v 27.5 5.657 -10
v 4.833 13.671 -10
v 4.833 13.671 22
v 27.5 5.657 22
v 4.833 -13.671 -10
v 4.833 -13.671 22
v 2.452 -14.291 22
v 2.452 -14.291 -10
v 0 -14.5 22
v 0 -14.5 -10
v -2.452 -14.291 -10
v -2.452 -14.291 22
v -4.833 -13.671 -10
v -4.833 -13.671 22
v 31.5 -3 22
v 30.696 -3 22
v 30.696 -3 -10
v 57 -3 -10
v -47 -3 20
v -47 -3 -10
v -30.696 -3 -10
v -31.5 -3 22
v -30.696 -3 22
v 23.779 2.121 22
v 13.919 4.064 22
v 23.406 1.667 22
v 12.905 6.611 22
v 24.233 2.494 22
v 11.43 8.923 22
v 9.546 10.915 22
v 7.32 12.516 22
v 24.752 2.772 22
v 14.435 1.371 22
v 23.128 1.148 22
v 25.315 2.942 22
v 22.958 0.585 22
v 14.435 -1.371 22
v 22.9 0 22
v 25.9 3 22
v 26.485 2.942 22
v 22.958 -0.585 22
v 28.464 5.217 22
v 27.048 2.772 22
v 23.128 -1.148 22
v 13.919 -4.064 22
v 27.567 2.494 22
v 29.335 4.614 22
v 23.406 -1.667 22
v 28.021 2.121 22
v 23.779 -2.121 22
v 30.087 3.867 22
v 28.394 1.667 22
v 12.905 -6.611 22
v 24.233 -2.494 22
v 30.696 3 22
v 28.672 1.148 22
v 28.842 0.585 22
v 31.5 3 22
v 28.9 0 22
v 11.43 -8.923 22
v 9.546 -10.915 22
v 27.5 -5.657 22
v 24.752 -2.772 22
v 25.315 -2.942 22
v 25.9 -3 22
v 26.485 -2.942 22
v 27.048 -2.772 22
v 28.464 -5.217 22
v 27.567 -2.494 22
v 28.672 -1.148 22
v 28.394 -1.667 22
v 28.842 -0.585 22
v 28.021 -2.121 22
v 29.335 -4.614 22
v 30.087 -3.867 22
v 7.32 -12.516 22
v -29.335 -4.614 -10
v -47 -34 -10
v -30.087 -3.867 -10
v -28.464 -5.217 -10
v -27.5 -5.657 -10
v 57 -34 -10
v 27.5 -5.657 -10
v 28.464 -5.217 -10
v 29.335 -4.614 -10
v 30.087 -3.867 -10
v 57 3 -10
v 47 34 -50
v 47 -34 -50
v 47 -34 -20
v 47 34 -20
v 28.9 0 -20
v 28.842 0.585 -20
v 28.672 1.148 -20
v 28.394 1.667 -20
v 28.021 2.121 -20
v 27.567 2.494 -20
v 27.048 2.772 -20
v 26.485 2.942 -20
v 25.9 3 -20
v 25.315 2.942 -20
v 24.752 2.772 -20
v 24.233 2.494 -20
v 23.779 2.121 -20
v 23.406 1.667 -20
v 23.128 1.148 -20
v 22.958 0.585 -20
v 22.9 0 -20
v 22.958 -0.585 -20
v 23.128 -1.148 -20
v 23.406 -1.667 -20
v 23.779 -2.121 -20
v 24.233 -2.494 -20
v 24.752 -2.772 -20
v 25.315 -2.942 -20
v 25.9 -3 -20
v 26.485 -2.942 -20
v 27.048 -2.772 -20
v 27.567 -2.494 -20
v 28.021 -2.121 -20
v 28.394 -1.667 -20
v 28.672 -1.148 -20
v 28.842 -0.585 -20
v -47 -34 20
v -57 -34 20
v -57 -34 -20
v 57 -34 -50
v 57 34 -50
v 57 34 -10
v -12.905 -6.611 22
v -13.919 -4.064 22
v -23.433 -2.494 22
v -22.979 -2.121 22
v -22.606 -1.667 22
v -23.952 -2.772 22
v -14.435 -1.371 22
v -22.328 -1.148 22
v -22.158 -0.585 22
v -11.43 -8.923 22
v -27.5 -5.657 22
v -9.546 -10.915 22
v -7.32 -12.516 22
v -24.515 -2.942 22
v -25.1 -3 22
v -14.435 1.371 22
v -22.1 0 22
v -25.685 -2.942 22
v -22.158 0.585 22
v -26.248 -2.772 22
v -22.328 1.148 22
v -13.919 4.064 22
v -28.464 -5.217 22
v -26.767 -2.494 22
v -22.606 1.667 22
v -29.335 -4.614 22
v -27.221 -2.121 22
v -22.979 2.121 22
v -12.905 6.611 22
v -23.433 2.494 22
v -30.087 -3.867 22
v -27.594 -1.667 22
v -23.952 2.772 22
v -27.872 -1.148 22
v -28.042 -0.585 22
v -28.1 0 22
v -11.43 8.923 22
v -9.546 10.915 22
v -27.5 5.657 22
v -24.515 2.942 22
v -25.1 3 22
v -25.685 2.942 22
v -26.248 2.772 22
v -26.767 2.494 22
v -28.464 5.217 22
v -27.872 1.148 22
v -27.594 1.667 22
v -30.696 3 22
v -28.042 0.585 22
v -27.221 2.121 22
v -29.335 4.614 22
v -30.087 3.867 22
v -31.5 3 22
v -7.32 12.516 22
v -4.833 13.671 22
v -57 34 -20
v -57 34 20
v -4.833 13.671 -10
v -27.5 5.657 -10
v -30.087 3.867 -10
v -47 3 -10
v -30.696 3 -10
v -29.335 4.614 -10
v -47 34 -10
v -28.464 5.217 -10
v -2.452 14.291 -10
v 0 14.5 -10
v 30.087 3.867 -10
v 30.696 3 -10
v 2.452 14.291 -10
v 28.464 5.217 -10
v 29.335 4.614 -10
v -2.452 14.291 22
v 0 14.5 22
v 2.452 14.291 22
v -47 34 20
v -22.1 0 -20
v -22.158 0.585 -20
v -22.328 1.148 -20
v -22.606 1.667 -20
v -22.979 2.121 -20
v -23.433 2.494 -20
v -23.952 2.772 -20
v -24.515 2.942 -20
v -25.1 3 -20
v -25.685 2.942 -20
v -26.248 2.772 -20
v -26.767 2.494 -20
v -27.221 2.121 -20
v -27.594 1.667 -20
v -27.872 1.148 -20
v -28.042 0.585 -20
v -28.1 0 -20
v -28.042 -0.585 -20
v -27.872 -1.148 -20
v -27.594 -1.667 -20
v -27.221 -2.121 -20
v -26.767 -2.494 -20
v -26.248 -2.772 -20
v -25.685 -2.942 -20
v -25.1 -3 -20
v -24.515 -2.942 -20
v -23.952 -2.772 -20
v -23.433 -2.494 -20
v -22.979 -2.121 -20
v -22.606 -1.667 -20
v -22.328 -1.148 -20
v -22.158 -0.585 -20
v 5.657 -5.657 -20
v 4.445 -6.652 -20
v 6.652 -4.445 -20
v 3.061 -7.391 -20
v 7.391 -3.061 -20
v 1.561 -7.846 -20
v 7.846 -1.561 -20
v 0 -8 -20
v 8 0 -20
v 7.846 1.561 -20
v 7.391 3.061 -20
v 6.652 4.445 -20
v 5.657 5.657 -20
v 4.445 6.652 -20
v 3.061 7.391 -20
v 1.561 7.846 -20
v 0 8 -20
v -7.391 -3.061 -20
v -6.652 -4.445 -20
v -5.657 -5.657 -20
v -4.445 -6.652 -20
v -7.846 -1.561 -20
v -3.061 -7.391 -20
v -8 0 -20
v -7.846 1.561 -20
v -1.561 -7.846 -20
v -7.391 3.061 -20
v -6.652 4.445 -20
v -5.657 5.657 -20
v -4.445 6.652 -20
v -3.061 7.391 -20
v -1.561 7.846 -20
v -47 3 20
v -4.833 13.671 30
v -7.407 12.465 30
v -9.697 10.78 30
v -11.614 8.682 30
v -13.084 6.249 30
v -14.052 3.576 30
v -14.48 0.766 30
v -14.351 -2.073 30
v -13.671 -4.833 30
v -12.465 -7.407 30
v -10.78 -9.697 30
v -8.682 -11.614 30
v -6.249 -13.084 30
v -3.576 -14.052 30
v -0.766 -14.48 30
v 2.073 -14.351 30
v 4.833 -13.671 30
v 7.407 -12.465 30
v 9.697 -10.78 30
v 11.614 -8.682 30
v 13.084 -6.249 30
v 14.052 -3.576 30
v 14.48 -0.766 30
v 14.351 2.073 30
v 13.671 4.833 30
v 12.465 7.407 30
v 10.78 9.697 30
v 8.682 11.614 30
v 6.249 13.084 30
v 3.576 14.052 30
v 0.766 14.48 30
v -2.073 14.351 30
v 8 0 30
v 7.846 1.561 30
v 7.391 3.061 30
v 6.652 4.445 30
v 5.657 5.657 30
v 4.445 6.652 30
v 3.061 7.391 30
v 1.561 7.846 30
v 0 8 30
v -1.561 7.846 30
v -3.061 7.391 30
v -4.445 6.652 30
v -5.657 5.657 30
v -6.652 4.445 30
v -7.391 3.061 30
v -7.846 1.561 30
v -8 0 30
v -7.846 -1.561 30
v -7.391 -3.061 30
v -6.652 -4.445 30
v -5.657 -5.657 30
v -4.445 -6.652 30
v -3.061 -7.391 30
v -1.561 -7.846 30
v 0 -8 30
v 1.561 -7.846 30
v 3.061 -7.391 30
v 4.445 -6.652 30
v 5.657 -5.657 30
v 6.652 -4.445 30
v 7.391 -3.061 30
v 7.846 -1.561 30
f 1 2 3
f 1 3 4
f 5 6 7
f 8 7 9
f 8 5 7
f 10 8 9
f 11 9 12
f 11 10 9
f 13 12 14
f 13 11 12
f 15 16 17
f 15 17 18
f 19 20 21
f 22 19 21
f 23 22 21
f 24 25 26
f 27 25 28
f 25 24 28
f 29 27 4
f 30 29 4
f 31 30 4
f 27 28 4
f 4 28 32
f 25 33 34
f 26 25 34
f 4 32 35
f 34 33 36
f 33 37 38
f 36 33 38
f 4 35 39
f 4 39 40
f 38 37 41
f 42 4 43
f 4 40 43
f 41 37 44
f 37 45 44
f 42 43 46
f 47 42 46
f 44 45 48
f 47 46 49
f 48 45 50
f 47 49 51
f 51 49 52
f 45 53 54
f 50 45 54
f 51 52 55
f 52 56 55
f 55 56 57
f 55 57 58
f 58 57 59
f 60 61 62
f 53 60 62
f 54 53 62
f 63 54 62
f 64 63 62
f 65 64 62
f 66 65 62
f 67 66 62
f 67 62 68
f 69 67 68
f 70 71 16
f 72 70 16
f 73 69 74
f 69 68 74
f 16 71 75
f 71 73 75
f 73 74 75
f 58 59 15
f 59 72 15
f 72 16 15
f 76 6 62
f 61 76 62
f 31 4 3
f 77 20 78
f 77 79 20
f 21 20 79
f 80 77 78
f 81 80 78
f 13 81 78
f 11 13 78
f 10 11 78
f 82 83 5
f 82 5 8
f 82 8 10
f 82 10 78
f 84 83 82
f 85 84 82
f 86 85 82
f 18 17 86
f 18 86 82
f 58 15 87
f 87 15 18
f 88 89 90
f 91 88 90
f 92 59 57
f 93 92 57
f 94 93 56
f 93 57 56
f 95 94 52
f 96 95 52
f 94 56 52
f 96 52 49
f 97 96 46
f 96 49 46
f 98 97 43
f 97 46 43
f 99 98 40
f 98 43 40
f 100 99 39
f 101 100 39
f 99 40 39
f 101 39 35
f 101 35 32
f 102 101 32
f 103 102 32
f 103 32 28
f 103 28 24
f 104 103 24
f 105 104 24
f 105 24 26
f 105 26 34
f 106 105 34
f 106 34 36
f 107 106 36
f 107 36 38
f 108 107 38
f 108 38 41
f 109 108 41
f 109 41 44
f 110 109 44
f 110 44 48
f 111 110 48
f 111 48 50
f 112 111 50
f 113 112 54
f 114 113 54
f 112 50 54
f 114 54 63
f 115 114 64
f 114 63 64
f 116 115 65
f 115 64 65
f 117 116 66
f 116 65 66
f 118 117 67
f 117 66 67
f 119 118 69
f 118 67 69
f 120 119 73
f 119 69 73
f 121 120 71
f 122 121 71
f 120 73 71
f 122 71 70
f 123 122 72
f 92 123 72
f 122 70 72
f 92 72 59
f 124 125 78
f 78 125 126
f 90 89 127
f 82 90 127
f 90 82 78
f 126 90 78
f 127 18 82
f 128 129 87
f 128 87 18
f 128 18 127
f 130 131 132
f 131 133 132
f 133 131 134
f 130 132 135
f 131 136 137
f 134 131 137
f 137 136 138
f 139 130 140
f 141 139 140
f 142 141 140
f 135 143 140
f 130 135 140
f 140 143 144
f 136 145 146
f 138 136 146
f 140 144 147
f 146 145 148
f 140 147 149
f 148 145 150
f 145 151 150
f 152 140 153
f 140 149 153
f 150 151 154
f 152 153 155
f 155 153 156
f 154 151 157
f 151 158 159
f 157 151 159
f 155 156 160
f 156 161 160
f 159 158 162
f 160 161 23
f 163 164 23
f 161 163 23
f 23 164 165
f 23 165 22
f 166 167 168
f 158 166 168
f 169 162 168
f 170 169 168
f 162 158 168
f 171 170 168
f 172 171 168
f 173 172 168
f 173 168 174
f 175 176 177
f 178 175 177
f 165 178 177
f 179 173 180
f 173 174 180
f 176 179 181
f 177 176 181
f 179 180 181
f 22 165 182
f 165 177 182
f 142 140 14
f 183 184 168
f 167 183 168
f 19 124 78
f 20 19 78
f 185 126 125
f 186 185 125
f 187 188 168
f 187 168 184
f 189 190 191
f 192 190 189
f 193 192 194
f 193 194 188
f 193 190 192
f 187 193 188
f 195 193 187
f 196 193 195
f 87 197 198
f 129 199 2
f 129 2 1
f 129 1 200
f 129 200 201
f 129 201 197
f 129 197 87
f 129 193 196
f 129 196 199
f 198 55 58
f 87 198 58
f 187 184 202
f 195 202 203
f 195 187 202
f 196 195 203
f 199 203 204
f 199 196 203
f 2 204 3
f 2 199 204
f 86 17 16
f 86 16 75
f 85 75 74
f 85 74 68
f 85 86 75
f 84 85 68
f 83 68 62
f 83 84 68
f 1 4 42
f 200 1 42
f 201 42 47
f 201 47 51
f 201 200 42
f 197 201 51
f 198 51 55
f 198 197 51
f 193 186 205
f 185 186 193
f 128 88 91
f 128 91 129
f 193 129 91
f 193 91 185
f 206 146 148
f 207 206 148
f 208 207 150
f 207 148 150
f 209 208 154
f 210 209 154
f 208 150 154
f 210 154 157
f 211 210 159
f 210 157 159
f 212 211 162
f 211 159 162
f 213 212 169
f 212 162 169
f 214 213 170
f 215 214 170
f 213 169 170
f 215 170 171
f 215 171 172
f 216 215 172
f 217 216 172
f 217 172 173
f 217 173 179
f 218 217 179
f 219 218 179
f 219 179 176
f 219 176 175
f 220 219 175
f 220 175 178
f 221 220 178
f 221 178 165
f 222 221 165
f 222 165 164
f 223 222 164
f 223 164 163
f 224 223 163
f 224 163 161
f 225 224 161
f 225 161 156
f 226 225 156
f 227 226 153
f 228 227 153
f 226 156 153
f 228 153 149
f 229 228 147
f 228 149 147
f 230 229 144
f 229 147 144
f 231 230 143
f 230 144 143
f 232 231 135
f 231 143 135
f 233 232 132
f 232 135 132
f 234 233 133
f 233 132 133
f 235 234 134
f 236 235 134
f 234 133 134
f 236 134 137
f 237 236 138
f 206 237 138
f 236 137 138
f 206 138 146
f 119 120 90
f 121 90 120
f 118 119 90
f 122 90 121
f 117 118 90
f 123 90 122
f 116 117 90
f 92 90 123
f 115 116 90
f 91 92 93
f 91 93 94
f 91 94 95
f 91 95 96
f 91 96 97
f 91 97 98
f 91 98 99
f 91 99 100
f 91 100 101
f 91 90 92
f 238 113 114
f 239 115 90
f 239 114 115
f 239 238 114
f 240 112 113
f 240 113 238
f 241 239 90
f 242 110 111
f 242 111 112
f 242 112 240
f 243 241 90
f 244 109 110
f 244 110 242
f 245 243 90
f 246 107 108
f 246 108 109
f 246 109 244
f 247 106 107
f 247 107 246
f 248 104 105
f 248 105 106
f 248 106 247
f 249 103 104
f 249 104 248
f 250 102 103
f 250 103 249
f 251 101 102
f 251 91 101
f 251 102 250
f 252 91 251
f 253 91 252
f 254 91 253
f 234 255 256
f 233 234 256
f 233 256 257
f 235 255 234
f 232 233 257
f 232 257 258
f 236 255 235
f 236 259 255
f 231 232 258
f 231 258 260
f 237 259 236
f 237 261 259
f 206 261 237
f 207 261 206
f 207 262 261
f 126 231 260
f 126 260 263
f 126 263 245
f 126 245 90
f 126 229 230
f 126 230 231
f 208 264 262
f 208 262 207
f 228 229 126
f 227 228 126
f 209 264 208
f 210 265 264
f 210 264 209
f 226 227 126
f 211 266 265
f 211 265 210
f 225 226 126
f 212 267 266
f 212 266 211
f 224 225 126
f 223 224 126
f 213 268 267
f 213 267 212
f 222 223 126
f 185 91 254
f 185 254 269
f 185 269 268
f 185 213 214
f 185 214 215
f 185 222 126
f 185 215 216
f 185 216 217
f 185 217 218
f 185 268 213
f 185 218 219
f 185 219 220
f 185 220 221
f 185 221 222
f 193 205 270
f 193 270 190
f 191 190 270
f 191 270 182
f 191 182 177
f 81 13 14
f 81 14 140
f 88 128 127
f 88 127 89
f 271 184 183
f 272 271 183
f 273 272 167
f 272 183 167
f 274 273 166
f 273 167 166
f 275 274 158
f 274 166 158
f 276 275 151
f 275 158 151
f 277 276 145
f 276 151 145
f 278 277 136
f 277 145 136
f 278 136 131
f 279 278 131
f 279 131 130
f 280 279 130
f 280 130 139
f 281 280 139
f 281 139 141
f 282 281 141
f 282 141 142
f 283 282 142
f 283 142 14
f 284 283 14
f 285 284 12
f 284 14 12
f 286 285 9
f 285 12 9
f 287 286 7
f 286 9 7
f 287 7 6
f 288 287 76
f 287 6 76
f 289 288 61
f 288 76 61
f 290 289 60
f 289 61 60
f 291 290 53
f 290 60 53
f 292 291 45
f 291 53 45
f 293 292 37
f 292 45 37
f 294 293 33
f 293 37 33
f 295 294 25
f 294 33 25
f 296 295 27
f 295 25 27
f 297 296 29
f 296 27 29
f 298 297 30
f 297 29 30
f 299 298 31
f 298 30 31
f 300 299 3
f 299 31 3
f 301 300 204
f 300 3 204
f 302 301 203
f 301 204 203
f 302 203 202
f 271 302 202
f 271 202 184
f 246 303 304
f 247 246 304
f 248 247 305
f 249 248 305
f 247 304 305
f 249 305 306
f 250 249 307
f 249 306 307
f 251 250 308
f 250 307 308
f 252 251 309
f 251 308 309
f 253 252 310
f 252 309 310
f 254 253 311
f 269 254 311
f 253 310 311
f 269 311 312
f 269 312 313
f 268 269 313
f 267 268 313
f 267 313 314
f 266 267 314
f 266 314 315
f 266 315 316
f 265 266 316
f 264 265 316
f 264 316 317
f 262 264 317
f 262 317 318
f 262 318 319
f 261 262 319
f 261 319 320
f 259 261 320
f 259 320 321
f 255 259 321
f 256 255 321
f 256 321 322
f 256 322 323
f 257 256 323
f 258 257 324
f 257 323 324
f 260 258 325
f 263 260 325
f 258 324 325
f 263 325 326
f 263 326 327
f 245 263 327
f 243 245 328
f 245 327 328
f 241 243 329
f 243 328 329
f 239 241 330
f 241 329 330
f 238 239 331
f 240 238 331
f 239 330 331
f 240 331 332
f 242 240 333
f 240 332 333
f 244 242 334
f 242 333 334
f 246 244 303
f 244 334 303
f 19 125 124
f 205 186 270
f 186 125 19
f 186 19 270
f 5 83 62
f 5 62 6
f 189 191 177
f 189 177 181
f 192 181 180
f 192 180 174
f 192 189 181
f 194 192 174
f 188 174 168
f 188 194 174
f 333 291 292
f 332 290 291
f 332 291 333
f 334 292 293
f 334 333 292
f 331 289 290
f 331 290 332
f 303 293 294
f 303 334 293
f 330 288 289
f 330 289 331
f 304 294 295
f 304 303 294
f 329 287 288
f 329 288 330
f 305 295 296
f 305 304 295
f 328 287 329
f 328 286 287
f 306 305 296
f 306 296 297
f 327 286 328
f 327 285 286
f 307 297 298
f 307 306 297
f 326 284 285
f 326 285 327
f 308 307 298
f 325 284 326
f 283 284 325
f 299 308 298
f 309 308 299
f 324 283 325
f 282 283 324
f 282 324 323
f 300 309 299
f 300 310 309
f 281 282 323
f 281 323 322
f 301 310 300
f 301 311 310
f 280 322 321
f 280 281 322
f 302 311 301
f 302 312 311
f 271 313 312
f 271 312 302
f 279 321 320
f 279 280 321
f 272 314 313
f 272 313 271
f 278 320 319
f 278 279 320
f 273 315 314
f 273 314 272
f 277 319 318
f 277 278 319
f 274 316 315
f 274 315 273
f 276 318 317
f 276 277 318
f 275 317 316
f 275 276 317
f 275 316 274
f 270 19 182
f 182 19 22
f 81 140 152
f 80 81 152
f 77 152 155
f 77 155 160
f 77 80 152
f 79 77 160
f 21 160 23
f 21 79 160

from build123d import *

# Parameters (mm, degrees)
ESTRUSIONE_ESTRUSIONE5_DEPTH = 34
ESTRUSIONE_ESTRUSIONE6_DEPTH = 32
SCHIZZO9_R                   = 14.5
ESTRUSIONE_ESTRUSIONE7_DEPTH = 8
SCHIZZO10_R                  = 8
TAGLIO_ESTRUSIONE1_DEPTH     = 104.947101932
SCHIZZO11_R                  = 3
TAGLIO_ESTRUSIONE2_DEPTH     = 98.923439482
NERVATURA1_START             = -3
NERVATURA1_DEPTH             = 6
NERVATURA11_START            = -3
NERVATURA11_DEPTH            = 6


with BuildPart() as part:
    # Schizzo7 → Estrusione-Estrusione5 (new, symmetric)
    with BuildSketch(Plane(origin=(0, 0, 0), x_dir=(1, 0, 0), z_dir=(0, 1, 0))):
        Polygon((-57, 20), (-57, -20), (-47, -20), (-47, 10), (57, 10), (57, 50), (47, 50), (47, 20), align=None)
    extrude(amount=ESTRUSIONE_ESTRUSIONE5_DEPTH, both=True)

    # Schizzo8 → Estrusione-Estrusione6 (add)
    with BuildSketch(Plane.XY.offset(-10)):
        with BuildLine():
            Line((-27.5, 5.656854249), (-4.833333333, 13.670731103))
            ThreePointArc((-4.833333333, 13.670731103), (0, 14.5), (4.833333333, 13.670731103))
            Line((4.833333333, 13.670731103), (27.5, 5.656854249))
            ThreePointArc((27.5, 5.656854249), (31.5, 0), (27.5, -5.656854249))
            Line((27.5, -5.656854249), (4.833333333, -13.670731103))
            ThreePointArc((4.833333333, -13.670731103), (0, -14.5), (-4.833333333, -13.670731103))
            Line((-4.833333333, -13.670731103), (-27.5, -5.656854249))
            ThreePointArc((-27.5, -5.656854249), (-31.5, 0), (-27.5, 5.656854249))
        make_face()
    extrude(amount=ESTRUSIONE_ESTRUSIONE6_DEPTH)

    # Schizzo9 → Estrusione-Estrusione7 (add)
    with BuildSketch(Plane.XY.offset(22)):
        with Locations(Location((0, 0, 0), (0, 0, 109.471220634))):
            Circle(SCHIZZO9_R)
    extrude(amount=ESTRUSIONE_ESTRUSIONE7_DEPTH)

    # Schizzo10 → Taglio-Estrusione1 (cut, through all)
    with BuildSketch(Plane.XY.offset(30)):
        Circle(SCHIZZO10_R)
    extrude(amount=-TAGLIO_ESTRUSIONE1_DEPTH, mode=Mode.SUBTRACT)

    # Schizzo11 → Taglio-Estrusione2 (cut, through all)
    with BuildSketch(Plane.XY.offset(22)):
        with Locations((-25.1, 0)):
            Circle(SCHIZZO11_R)
        with Locations((25.9, 0)):
            Circle(SCHIZZO11_R)
    extrude(amount=-TAGLIO_ESTRUSIONE2_DEPTH, mode=Mode.SUBTRACT)

    # Nervatura1: read off the stored shape, not the designer's step
    # Nervatura1 outline → Nervatura1 (add)
    with BuildSketch(Plane(origin=(0, 0, 0), x_dir=(1, 0, 0), z_dir=(0, 1, 0)).offset(NERVATURA1_START)):
        Polygon((31.5, -22), (57, 10), (30.696152423, 10), (30.696152423, -22), align=None)
    extrude(amount=NERVATURA1_DEPTH)

    # Nervatura11: read off the stored shape, not the designer's step
    # Nervatura11 outline → Nervatura11 (add)
    with BuildSketch(Plane(origin=(0, 0, 0), x_dir=(1, 0, 0), z_dir=(0, 1, 0)).offset(NERVATURA11_START)):
        Polygon((-30.696152423, 10), (-47, 10), (-47, -20), (-31.5, -22), (-30.696152423, -22), align=None)
    extrude(amount=NERVATURA11_DEPTH)


solid = part.part
